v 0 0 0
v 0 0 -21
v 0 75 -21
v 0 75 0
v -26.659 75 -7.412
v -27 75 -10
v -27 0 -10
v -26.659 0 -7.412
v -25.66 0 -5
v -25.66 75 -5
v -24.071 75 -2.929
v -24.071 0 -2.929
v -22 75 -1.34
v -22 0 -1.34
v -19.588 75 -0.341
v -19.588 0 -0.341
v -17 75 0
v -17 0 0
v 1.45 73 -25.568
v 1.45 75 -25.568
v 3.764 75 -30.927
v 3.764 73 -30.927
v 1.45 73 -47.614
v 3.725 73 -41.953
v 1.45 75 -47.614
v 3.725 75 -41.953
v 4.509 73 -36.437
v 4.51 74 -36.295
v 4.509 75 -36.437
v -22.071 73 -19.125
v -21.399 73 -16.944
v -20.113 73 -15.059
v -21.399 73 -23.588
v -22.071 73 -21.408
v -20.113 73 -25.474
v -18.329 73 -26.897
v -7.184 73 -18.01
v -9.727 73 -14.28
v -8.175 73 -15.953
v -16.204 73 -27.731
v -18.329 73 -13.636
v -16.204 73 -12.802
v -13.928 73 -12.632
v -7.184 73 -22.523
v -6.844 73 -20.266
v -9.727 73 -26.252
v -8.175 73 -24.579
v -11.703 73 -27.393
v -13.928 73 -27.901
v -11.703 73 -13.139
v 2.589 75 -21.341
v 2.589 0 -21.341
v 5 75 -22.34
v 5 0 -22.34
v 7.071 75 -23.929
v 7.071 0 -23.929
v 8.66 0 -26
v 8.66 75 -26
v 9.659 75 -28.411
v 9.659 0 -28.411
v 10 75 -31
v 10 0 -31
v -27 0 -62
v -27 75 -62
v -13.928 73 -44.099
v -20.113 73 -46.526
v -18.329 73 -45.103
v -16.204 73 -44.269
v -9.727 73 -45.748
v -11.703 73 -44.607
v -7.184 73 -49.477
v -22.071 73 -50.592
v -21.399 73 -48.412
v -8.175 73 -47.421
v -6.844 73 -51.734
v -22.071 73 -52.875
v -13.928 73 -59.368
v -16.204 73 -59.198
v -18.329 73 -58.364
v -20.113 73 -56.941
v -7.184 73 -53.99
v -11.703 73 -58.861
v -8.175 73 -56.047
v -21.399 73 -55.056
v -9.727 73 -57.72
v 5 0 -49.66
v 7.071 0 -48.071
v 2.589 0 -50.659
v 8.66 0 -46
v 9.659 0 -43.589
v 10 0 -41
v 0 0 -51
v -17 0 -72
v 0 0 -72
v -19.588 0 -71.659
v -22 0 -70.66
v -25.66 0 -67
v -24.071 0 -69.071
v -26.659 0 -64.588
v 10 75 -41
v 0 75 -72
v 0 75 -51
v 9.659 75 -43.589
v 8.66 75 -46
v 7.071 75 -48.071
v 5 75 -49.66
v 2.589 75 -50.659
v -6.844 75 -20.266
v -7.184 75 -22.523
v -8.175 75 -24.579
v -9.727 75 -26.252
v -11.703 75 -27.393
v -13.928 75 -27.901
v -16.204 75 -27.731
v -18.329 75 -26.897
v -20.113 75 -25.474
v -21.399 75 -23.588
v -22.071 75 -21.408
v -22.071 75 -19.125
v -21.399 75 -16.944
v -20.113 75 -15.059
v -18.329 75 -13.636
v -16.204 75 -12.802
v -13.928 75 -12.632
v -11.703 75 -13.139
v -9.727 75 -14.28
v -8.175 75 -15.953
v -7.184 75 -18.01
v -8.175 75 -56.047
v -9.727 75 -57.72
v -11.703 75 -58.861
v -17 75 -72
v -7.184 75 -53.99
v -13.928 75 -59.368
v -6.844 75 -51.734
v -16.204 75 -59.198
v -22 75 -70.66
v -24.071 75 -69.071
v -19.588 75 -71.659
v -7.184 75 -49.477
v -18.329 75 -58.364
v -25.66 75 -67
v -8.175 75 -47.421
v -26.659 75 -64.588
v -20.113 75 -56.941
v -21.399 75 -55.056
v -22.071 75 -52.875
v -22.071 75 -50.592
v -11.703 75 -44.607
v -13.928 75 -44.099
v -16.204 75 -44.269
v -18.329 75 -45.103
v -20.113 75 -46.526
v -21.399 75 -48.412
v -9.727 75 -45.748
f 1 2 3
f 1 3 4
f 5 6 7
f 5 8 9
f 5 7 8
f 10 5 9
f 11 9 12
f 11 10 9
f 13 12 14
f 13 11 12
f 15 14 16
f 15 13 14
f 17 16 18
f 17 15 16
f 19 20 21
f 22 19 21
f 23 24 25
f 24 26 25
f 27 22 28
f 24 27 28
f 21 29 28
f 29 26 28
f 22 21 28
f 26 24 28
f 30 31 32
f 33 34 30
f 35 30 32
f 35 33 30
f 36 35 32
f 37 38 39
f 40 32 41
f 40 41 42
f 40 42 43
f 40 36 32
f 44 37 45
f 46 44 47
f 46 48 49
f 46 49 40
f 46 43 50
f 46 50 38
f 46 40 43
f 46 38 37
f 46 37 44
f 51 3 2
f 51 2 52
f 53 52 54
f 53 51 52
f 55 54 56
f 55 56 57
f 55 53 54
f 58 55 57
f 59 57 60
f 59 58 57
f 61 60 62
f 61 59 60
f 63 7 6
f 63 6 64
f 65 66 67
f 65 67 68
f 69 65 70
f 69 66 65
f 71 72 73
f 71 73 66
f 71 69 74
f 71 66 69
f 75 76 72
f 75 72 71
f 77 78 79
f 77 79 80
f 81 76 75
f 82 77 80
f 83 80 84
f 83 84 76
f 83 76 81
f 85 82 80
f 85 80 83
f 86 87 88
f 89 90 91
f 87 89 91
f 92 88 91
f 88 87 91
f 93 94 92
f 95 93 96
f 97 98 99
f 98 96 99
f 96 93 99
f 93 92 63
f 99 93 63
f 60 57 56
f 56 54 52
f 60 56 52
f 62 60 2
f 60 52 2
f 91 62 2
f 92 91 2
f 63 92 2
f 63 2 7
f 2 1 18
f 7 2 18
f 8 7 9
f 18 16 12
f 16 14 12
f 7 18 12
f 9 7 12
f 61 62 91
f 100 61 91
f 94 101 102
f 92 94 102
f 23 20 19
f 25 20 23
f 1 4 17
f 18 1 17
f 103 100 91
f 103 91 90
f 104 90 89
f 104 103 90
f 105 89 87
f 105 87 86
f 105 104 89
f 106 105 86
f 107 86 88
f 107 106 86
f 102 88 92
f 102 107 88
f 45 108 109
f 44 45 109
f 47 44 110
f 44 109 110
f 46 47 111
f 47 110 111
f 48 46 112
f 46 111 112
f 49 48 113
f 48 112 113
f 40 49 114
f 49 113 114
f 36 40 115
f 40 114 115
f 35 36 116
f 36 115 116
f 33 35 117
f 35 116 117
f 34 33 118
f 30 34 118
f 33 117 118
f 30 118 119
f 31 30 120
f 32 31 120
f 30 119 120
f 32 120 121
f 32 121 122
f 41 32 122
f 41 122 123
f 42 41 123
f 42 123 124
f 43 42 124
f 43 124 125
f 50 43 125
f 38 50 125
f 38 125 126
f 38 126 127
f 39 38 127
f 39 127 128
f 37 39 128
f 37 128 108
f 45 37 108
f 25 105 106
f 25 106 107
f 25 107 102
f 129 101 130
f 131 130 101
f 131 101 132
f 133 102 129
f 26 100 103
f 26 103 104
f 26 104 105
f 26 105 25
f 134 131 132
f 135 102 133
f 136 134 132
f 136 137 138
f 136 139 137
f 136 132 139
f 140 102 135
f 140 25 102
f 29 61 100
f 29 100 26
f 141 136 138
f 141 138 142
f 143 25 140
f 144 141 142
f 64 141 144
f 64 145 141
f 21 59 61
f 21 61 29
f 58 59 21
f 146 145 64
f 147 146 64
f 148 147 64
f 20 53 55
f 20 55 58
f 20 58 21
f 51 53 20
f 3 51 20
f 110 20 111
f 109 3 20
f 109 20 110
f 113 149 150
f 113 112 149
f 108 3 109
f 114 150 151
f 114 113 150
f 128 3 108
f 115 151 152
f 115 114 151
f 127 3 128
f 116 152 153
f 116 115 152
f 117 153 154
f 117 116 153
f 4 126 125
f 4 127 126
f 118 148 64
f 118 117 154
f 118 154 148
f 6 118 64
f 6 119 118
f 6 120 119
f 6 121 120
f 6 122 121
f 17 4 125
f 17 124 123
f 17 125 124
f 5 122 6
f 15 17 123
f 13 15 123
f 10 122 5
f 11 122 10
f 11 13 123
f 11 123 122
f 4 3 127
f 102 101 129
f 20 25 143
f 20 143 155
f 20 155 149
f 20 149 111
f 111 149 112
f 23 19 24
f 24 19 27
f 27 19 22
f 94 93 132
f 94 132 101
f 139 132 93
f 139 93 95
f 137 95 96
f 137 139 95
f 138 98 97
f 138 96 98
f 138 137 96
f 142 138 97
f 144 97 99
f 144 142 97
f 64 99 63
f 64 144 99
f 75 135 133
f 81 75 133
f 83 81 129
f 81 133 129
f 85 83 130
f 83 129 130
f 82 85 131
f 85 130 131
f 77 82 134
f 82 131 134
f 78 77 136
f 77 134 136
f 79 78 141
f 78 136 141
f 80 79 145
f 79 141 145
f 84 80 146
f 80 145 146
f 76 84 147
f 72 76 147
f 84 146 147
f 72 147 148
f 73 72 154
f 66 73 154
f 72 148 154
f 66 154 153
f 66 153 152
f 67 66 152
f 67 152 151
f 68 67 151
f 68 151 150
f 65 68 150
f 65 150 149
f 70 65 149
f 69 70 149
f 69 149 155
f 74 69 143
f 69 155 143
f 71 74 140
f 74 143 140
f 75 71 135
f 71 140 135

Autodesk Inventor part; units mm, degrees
ref_plane "YZ Plane" through (0, 0, 0) normal (1, 0, 0) x (0, 1, 0)
ref_plane "XZ Plane" through (0, 0, 0) normal (0, 1, 0) x (-1, 0, 0)
ref_plane "XY Plane" through (0, 0, 0) normal (0, 0, 1) x (1, 0, 0)
sketch "Esquisse1" plane through (0, 0, 0) normal (0, 1, 0) x (-1, 0, 0)
  line L0 (0, 0) -> (27, 0)
  line L1 (27, 0) -> (27, -72)
  line L2 (27, -72) -> (0, -72)
  line L3 (0, -72) -> (0, 0)
  line L4 (0, -21) -> (-10, -21)
  line L5 (-10, -21) -> (-10, -51)
  line L6 (-10, -51) -> (0, -51)
  line L7 (0, -51) -> (0, -21)
  point P0 (0, -36)
  dimension "d0" = 27
  dimension "d1" = 72
  dimension "d2" = 30
  dimension "d3" = 10
extrude "Extrusion1" add sketch "Esquisse1" along normal blind 75
sketch "Esquisse2" plane through (0, 75, 0) normal (0, 1, 0) x (1, 0, 0)
  line L0 (0, 21) -> (10, 21) construction
  line L1 (10, 21) -> (10, 51) construction
  line L2 (10, 51) -> (0, 51) construction
  line L3 (0, 51) -> (0, 72) construction
  line L4 (0, 72) -> (-27, 72) construction
  line L5 (-27, 72) -> (-27, 0) construction
  line L6 (-27, 0) -> (0, 0) construction
  line L7 (0, 0) -> (0, 21) construction
  line L8 (-27, 72) -> (-27, 0) construction
  line L9 (-27, 72) -> (-27, 0) construction
  line L10 (-27, 36) -> (10, 36) construction
  circle A0 centre (-14.5005, 20.2664) radius 7.6563
  circle A1 centre (-14.5005, 51.7336) radius 7.6563
  line L11 (1.4504, 25.5678) -> (1.4504, 47.6136)
  line L12 (1.4504, 25.5678) -> (7.5686, 36) construction
  line L13 (7.5686, 36) -> (1.4504, 47.6136) construction
  spline S0 degree 2 poles (1.4504, 25.5678) (7.5686, 36) (1.4504, 47.6136) knots 1 1 1 2 2 2
  dimension "d28" = 15.3126
extrude "Extrusion2" cut sketch "Esquisse2" against normal blind 2
fillet "Congé1" radius 10 2 edges at (-27, 37.5, -72) (-27, 37.5, 0)
fillet "Congé2" radius 10 2 edges at (10, 37.5, -51) (10, 37.5, -21)
ref_plane "Plan de construction1" through (0, 60, 0) normal (0, 1, 0) x (1, 0, 0)
sketch "Esquisse3" plane through (0, 0, -72) normal (0, 0, -1) x (-1, 0, 0)
  point P0 (0, 0)
sketch "Esquisse4" plane through (0, 60, 0) normal (0, 1, 0) x (1, 0, 0)
  arc A0 (0, 21) -> (10, 31) centre (0, 31) ccw projected
  line L0 (10, 31) -> (10, 41) projected
  arc A1 (10, 41) -> (0, 51) centre (0, 41) ccw projected
  line L1 (0, 51) -> (0, 72) projected
  line L2 (0, 72) -> (-17, 72) projected
  arc A2 (-17, 72) -> (-27, 62) centre (-17, 62) ccw projected
  line L3 (-27, 62) -> (-27, 10) projected
  arc A3 (-27, 10) -> (-17, 0) centre (-17, 10) ccw projected
  line L4 (-17, 0) -> (0, 0) projected
  line L5 (0, 0) -> (0, 21) projected
  circle A4 centre (-14.5005, 20.2664) radius 7.6563 projected
  line L6 (1.4504, 25.5678) -> (1.4504, 47.6136) projected
  circle A5 centre (-14.5005, 51.7336) radius 7.6563 projected
  line L7 (0, 72) -> (-17, 72) projected
  line L8 (-14.5005, 72) -> (-37.6894, 78.8251)
  line L9 (-37.6894, 78.8251) -> (-26.0949, 60.5542)
  line L10 (-26.0949, 60.5542) -> (-14.5005, 72)
ref_plane "Plan de construction2" through (0, 0, -36) normal (0, 0, -1) x (-1, 0, 0)
properties part number "head2"
